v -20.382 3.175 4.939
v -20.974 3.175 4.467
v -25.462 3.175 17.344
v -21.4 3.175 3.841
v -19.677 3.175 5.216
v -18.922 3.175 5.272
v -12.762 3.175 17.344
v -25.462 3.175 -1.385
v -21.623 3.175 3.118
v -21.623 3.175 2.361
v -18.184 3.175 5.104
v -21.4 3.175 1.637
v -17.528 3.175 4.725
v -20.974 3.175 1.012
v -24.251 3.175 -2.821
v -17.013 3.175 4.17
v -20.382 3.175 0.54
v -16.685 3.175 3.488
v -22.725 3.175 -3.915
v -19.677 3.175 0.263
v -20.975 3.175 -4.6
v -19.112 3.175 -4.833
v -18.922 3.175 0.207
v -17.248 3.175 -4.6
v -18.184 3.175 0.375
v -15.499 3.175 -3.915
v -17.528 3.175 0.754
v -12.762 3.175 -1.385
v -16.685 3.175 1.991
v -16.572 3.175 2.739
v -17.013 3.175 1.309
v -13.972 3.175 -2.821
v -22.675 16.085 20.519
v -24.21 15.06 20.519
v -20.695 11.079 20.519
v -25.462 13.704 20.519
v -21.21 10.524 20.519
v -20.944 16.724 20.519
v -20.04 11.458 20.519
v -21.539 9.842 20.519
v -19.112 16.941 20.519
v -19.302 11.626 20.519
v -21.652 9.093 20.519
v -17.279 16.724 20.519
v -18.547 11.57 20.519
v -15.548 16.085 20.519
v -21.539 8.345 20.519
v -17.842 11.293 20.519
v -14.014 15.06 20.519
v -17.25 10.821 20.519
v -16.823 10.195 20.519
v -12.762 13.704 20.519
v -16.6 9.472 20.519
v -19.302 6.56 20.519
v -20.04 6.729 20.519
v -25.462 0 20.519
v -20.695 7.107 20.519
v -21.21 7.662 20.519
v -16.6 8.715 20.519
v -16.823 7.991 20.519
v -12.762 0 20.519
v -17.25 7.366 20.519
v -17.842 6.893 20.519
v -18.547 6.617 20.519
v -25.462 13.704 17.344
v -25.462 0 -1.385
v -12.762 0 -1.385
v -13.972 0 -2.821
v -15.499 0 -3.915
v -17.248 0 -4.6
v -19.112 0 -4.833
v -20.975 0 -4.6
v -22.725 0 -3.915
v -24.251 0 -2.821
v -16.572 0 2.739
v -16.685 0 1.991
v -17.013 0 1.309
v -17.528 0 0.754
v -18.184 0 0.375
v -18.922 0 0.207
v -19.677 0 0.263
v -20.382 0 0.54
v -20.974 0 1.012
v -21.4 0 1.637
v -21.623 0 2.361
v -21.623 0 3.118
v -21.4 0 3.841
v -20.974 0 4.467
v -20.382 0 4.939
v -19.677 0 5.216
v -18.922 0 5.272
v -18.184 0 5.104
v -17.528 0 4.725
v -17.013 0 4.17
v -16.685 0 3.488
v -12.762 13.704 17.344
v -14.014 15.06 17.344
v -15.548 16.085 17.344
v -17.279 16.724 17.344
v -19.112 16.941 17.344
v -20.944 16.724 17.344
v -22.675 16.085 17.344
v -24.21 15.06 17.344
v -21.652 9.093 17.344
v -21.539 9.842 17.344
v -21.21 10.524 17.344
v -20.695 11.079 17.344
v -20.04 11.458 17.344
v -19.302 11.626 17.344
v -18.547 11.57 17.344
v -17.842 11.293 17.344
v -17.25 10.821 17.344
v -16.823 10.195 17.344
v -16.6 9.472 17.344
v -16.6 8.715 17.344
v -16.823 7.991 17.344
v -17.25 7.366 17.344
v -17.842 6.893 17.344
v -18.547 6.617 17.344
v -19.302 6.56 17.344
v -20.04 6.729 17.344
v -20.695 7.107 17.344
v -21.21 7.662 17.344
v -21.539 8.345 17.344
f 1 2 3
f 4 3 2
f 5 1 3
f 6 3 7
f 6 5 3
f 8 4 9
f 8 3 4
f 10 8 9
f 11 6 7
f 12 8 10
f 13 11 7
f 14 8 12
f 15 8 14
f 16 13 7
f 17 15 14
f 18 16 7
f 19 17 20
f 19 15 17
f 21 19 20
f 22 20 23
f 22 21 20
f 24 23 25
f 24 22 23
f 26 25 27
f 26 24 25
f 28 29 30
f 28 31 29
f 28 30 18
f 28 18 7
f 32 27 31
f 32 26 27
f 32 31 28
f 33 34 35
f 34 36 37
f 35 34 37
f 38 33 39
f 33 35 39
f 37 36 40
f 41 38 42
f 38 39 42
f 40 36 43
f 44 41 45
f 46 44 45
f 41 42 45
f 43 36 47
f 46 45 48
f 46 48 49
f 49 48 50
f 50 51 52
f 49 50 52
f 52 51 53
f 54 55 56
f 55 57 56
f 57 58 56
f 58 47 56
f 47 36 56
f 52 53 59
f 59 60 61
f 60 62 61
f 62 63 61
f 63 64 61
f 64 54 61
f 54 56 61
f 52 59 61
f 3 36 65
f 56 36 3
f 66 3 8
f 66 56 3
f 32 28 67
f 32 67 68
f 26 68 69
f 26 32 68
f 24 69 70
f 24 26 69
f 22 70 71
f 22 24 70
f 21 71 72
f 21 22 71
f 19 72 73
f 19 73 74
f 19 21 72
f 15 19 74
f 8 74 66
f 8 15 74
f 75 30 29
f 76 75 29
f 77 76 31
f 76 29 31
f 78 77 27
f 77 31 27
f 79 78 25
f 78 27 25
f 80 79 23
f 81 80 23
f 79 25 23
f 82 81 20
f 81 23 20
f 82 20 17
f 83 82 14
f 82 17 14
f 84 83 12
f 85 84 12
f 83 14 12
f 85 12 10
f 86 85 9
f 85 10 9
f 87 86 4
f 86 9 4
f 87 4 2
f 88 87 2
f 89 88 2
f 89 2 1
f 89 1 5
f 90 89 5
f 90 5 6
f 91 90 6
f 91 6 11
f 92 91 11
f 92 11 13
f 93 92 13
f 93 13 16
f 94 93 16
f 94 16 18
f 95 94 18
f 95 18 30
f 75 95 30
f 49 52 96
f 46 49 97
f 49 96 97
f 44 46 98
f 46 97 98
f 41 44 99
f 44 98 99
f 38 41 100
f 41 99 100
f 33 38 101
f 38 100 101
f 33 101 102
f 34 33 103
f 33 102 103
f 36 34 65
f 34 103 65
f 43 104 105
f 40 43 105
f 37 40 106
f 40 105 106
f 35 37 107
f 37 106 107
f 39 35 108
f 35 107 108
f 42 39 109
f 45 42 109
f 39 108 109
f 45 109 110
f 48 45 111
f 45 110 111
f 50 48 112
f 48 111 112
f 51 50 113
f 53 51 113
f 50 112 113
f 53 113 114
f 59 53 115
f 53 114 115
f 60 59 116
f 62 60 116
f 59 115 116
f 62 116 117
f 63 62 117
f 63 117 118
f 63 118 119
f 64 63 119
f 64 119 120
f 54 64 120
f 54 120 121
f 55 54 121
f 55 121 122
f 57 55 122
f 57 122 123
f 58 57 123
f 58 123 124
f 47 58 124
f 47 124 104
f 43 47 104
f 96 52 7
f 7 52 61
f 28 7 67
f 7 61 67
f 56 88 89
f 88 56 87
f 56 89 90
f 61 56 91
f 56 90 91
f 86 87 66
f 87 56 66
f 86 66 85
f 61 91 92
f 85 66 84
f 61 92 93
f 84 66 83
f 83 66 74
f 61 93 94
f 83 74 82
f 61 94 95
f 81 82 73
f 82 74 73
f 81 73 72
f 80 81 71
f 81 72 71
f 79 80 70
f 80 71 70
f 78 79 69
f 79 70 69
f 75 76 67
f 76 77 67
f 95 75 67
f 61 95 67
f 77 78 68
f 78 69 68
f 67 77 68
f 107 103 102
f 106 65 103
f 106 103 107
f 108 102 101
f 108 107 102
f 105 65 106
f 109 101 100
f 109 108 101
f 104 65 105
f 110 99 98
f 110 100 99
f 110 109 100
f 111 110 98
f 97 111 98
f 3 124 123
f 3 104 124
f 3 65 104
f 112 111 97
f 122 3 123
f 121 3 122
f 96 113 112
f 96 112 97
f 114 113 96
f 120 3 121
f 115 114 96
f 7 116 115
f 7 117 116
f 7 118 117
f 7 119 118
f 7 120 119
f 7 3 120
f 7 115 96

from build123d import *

# Parameters (mm, degrees)
SKETCH1_W           = 12.7
SKETCH1_H           = 25.4
BOSS_EXTRUDE1_DEPTH = 3.175
SKETCH2_W           = 12.7
SKETCH2_H           = 3.175
BOSS_EXTRUDE2_DEPTH = 13.7922
SKETCH3_R           = 2.54
CUT_EXTRUDE1_DEPTH  = 4.175
CUT_EXTRUDE2_DEPTH  = 4.175
SKETCH5_R           = 2.54
CUT_EXTRUDE3_DEPTH  = 4.175
CUT_EXTRUDE4_DEPTH  = 4.175


with BuildPart() as part:
    # Sketch1 → Boss-Extrude1 (new body)
    with BuildSketch(Plane(origin=(0, 0, 0), x_dir=(1, 0, 0), z_dir=(0, 1, 0))):
        with Locations((-19.111794294, -7.819421488)):
            Rectangle(SKETCH1_W, SKETCH1_H)
    extrude(amount=BOSS_EXTRUDE1_DEPTH)

    # Sketch2 → Boss-Extrude2 (add)
    with BuildSketch(Plane(origin=(0, 3.175, 0), x_dir=(1, 0, 0), z_dir=(0, 1, 0))):
        with Locations((-19.111794294, -18.931921488)):
            Rectangle(SKETCH2_W, SKETCH2_H)
    extrude(amount=BOSS_EXTRUDE2_DEPTH)

    # Sketch3 → Cut-Extrude1 (cut, through all)
    with BuildSketch(Plane(origin=(0, 3.175, 0), x_dir=(1, 0, 0), z_dir=(0, 1, 0))):
        with Locations((-19.111794294, -2.739421488)):
            Circle(SKETCH3_R)
    extrude(amount=-CUT_EXTRUDE1_DEPTH, mode=Mode.SUBTRACT)

    # Sketch4 → Cut-Extrude2 (cut, through all)
    with BuildSketch(Plane(origin=(0, 3.175, 0), x_dir=(1, 0, 0), z_dir=(0, 1, 0))):
        with BuildLine():
            Line((-25.461794294, 4.880578512), (-12.761794294, 4.880578512))
            Line((-12.761794294, 4.880578512), (-12.761794294, 1.385127101))
            ThreePointArc((-12.761794294, 1.385127101), (-19.111794294, 4.832526813), (-25.461794294, 1.385127101))
            Line((-25.461794294, 1.385127101), (-25.461794294, 4.880578512))
        make_face()
    extrude(amount=-CUT_EXTRUDE2_DEPTH, mode=Mode.SUBTRACT)

    # Sketch5 → Cut-Extrude3 (cut, through all)
    with BuildSketch(Plane(origin=(0, 0, 17.344421488), x_dir=(-1, 0, 0), z_dir=(0, 0, -1))):
        with Locations((19.111794294, 9.0932)):
            Circle(SKETCH5_R)
    extrude(amount=-CUT_EXTRUDE3_DEPTH, mode=Mode.SUBTRACT)

    # Sketch6 → Cut-Extrude4 (cut, through all)
    with BuildSketch(Plane(origin=(0, 0, 17.344421488), x_dir=(-1, 0, 0), z_dir=(0, 0, -1))):
        with BuildLine():
            Line((25.461794294, 16.9672), (12.761794294, 16.9672))
            Line((12.761794294, 16.9672), (12.761794294, 13.704377903))
            ThreePointArc((12.761794294, 13.704377903), (19.111794294, 16.940840515), (25.461794294, 13.704377903))
            Line((25.461794294, 13.704377903), (25.461794294, 16.9672))
        make_face()
    extrude(amount=-CUT_EXTRUDE4_DEPTH, mode=Mode.SUBTRACT)


solid = part.part
